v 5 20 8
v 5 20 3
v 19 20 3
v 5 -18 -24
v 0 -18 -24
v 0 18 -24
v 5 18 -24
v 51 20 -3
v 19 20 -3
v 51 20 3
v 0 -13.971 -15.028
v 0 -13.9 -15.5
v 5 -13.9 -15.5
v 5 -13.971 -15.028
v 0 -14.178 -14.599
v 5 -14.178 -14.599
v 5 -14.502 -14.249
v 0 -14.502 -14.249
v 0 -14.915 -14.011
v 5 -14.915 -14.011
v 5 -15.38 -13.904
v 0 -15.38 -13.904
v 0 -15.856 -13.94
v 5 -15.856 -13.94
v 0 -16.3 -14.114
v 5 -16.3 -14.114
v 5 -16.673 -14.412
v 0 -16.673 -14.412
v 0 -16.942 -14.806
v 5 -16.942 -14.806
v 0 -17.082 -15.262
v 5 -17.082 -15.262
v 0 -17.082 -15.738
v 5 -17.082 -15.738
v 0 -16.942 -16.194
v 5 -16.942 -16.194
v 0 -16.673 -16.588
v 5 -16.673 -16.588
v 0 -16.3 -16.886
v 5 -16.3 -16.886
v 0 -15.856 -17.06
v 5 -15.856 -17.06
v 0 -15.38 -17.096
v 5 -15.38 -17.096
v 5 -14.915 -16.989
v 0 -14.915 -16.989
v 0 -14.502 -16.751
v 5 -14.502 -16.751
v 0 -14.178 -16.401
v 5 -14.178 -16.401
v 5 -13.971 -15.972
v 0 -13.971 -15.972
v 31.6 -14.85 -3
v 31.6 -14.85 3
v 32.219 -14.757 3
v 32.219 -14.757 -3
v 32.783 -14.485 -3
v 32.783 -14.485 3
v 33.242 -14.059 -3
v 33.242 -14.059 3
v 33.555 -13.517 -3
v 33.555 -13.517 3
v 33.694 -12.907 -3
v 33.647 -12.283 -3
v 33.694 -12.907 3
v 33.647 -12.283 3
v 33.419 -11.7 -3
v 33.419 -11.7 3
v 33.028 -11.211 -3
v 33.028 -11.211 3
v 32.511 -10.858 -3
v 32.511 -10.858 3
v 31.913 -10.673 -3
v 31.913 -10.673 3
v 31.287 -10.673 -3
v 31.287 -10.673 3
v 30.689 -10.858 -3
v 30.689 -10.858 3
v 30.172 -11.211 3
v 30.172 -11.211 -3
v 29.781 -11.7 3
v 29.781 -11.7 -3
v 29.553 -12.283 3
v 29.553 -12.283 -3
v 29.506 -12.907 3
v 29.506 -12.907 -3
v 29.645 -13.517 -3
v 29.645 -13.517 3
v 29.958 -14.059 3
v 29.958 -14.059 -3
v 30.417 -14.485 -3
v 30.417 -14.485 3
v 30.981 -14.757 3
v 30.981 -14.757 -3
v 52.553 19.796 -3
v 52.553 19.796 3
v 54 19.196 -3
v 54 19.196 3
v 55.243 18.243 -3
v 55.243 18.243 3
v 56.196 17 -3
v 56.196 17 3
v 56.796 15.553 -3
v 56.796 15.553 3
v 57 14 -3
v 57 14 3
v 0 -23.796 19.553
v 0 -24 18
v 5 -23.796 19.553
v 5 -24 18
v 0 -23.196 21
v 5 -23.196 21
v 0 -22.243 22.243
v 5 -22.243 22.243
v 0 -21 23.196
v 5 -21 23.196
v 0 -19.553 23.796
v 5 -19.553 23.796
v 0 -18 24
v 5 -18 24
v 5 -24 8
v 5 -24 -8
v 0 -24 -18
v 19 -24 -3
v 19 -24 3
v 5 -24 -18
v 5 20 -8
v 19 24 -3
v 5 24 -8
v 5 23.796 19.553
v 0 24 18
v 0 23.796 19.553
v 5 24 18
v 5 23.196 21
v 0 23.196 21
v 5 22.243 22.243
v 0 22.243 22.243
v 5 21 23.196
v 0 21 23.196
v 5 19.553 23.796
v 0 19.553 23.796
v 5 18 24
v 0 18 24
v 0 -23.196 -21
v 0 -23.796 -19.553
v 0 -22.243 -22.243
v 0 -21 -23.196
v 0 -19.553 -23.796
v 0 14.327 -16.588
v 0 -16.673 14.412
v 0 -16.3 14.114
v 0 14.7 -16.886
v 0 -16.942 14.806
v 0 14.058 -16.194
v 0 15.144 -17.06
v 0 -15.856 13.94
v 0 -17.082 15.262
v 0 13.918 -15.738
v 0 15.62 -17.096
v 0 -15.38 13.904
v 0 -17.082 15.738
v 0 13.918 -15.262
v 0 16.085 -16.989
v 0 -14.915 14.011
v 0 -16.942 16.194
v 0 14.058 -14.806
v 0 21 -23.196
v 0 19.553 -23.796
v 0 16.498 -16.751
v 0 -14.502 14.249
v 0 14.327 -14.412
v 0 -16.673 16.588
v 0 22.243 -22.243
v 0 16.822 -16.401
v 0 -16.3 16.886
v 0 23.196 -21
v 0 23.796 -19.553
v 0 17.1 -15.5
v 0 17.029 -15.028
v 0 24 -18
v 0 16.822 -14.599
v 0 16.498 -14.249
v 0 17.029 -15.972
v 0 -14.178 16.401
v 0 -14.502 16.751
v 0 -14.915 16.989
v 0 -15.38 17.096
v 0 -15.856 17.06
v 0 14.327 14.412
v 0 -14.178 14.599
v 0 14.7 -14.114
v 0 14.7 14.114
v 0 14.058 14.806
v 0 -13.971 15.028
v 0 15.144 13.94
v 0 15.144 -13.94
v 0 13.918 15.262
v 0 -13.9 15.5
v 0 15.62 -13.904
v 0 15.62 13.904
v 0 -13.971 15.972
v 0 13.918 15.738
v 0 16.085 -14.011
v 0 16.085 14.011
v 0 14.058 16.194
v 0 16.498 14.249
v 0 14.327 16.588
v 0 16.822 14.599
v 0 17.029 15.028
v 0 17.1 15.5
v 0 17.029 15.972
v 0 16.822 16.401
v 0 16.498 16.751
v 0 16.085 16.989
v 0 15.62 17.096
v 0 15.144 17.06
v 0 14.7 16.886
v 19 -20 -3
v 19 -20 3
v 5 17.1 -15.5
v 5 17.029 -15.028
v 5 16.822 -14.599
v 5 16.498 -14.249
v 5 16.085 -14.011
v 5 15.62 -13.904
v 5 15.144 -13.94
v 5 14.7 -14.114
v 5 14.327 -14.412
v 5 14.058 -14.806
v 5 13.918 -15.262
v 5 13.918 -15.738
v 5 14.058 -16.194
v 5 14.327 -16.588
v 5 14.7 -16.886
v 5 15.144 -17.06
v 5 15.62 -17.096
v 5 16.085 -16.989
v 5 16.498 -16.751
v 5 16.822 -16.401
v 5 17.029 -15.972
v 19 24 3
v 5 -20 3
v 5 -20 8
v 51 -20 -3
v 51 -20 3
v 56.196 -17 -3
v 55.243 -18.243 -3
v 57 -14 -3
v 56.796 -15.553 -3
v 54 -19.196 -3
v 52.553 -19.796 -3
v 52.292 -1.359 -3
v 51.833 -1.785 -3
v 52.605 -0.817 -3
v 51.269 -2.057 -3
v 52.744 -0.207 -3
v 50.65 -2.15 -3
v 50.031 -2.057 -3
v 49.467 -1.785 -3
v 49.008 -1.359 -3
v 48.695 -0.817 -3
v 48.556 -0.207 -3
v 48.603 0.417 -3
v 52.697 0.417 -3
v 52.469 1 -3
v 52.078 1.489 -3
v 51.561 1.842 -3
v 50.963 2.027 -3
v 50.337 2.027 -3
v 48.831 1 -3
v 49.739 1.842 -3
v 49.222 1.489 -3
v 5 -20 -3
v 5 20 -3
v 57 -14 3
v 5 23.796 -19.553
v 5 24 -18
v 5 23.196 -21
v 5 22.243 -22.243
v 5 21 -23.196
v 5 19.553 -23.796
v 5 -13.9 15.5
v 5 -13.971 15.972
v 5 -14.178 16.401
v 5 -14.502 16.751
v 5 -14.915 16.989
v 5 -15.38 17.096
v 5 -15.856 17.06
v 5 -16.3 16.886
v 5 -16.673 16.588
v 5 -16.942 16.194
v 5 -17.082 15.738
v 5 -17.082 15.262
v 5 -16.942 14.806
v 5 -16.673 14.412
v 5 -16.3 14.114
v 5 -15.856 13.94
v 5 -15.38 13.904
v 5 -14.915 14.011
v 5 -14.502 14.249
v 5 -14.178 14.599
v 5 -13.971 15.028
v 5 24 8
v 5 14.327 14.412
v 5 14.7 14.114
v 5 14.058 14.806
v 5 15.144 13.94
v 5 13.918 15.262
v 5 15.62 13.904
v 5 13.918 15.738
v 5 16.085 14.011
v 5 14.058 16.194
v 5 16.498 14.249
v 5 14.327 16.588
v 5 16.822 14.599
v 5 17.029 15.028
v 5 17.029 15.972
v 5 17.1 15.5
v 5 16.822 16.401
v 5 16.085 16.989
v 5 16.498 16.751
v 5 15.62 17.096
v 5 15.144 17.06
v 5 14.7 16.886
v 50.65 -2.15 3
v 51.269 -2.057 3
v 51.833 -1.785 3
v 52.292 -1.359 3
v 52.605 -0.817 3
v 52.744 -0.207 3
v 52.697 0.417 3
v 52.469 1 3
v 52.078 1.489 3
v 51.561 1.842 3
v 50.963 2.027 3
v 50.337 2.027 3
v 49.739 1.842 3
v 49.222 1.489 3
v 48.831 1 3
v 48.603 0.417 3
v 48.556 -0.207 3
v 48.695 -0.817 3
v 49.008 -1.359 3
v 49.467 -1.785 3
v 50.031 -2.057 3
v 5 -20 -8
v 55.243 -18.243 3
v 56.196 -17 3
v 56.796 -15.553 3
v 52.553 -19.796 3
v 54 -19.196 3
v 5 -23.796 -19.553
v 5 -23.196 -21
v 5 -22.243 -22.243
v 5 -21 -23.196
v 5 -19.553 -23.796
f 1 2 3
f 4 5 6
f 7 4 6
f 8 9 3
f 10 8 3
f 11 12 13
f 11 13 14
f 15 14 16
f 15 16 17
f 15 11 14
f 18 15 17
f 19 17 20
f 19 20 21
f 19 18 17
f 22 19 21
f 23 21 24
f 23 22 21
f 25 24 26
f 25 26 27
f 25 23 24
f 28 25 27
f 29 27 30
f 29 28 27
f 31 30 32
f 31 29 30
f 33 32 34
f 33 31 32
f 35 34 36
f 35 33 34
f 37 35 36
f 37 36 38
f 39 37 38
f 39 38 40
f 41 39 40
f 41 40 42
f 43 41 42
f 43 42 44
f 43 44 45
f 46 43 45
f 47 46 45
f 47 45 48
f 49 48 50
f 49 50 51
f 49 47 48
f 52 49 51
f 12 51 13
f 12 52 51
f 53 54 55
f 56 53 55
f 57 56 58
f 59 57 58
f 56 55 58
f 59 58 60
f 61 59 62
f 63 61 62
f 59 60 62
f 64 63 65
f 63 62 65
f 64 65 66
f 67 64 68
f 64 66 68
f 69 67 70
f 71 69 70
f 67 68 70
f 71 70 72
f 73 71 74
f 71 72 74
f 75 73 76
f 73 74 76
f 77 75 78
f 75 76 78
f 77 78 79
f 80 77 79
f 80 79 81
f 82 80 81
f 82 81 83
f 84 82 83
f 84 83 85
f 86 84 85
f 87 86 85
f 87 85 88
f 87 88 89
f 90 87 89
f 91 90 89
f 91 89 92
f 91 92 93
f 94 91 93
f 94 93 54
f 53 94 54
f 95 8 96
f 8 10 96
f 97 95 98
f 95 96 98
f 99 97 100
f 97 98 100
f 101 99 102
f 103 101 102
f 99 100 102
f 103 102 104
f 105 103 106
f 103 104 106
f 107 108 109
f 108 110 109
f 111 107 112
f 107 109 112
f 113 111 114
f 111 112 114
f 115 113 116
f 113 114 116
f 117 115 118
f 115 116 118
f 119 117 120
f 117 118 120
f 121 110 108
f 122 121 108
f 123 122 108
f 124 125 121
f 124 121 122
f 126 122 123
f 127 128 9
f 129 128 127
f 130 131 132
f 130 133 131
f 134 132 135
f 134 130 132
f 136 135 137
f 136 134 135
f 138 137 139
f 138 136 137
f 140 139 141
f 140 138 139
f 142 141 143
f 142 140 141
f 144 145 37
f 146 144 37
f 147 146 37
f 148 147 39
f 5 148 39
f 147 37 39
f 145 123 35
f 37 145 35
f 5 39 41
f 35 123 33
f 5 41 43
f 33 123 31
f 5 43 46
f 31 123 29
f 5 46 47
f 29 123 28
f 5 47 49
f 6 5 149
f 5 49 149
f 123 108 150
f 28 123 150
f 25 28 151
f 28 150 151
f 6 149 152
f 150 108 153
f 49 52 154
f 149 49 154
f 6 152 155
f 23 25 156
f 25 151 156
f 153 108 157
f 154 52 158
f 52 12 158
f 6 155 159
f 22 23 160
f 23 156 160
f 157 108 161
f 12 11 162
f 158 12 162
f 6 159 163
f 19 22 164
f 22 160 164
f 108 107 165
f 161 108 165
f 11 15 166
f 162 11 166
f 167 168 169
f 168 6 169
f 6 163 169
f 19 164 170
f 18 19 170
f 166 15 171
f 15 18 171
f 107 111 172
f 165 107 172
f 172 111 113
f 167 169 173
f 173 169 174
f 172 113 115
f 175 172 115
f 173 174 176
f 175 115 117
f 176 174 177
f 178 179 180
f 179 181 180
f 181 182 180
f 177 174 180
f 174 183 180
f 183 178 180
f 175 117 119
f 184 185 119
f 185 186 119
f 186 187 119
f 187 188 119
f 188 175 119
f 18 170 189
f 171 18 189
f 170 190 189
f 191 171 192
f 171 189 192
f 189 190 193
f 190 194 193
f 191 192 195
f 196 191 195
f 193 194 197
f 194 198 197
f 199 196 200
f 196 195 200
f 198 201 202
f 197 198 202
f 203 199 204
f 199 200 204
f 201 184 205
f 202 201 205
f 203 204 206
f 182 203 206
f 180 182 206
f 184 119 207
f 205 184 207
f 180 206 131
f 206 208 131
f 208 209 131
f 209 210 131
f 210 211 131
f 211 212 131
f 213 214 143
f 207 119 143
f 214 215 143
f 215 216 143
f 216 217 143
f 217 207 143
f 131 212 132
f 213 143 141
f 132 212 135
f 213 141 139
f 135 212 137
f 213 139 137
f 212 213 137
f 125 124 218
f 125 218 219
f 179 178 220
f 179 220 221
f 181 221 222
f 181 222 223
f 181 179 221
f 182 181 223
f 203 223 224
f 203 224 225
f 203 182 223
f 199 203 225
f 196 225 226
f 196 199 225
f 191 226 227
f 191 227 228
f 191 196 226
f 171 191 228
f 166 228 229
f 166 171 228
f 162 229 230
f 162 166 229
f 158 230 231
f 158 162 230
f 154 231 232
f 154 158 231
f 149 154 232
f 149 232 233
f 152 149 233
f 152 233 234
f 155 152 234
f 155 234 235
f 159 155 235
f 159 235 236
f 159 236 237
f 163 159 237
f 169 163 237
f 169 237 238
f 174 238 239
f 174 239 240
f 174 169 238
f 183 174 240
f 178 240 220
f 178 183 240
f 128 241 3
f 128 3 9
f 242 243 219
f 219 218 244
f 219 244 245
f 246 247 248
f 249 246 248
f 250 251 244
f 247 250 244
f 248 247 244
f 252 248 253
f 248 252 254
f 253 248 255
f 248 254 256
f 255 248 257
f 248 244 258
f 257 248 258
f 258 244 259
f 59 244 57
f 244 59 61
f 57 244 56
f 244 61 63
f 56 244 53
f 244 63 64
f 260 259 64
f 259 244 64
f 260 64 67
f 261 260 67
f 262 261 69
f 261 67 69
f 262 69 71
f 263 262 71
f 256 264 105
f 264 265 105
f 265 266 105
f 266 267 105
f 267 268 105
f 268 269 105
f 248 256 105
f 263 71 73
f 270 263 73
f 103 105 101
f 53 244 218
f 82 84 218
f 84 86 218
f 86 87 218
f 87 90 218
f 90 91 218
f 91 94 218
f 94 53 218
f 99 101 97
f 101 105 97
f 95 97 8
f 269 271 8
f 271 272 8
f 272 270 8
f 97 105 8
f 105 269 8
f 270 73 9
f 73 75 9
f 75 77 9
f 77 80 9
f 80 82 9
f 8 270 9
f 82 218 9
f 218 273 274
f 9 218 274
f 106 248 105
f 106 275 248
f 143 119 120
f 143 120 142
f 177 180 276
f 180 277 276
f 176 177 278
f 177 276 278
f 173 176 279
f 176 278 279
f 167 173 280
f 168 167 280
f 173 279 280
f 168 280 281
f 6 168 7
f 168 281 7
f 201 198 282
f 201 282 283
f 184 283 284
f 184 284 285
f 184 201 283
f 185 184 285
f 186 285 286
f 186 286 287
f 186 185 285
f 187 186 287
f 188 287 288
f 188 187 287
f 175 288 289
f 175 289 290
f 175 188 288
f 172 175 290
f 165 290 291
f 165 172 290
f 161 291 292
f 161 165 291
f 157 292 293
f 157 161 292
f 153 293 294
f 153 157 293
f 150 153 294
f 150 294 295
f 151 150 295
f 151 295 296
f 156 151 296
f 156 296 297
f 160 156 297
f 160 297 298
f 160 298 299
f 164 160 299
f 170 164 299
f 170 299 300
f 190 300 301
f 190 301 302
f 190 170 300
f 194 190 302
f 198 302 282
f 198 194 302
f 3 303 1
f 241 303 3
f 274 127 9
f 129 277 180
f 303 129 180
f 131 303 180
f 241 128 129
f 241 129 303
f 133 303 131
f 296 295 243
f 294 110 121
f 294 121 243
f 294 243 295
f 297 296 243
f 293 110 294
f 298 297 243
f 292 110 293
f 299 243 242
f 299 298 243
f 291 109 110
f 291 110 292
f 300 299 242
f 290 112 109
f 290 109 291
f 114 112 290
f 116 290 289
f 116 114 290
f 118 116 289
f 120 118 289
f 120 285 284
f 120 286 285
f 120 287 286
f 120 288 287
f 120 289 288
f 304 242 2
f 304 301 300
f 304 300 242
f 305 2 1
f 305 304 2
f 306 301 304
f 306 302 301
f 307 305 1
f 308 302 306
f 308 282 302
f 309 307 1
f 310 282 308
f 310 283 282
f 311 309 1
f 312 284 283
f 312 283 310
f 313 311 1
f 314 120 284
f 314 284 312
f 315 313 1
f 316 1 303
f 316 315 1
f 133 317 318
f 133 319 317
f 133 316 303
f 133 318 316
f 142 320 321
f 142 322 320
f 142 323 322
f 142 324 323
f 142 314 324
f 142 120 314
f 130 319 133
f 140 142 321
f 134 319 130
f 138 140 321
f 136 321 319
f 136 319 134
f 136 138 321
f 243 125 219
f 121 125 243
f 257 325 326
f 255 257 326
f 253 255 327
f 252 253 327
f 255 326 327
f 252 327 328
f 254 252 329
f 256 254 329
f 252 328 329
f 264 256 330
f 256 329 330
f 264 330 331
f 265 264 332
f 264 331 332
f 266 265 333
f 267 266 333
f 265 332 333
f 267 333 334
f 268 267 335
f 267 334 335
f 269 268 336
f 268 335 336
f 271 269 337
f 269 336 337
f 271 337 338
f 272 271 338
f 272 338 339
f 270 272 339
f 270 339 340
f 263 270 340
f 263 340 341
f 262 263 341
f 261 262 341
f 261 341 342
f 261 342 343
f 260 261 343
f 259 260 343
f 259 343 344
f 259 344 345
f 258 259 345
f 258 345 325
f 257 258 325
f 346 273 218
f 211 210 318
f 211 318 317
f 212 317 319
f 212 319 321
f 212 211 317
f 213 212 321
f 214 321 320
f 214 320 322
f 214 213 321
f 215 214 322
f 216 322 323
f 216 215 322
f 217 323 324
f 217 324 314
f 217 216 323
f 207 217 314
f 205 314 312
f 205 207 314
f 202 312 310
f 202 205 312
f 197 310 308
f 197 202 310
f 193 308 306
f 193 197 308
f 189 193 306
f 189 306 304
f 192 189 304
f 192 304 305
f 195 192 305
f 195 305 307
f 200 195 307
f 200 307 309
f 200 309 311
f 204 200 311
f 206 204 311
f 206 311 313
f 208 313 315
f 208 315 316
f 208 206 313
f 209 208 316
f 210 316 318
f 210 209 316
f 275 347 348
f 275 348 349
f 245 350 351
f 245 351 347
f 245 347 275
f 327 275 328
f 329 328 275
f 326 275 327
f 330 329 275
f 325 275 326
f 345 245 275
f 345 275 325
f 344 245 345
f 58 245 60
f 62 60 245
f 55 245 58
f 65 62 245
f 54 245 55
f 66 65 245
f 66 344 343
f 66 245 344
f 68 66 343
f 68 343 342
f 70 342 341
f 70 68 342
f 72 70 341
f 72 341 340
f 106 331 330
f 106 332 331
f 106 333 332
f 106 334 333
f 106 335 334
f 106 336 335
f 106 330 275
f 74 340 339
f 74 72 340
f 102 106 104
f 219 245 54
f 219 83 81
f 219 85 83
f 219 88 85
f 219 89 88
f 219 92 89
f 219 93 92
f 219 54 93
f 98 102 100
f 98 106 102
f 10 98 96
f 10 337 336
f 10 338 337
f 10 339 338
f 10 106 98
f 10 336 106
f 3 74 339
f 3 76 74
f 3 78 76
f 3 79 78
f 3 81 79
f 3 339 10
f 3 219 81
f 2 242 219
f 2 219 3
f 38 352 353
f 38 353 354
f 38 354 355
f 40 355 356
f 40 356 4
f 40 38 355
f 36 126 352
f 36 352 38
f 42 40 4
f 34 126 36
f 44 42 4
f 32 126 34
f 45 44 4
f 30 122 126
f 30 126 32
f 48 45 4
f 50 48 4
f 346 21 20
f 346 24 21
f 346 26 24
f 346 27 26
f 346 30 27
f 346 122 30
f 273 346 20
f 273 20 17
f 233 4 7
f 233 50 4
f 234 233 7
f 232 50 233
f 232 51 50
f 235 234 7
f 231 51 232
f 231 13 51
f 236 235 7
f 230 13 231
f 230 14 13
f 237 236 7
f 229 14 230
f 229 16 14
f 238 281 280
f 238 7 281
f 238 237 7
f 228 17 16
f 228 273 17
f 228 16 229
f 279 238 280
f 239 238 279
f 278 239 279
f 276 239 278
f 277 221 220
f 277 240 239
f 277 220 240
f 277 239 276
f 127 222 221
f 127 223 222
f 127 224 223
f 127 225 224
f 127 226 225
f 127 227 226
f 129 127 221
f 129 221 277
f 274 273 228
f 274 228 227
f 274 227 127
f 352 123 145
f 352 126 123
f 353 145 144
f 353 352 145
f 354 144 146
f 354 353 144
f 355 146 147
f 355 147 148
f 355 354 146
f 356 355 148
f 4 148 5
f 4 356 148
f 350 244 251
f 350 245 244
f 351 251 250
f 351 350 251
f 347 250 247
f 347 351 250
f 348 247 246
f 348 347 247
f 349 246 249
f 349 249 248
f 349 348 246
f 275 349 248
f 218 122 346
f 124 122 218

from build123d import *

# Parameters (mm, degrees)
SKETCH_W     = 48
SKETCH_H     = 48
SKETCH_R     = 1.6
PAD_DEPTH    = 5
SKETCH001_W  = 40
SKETCH001_H  = 6
PAD001_DEPTH = 52
PAD002_DEPTH = 4
PAD003_DEPTH = 4
SKETCH004_R  = 2.1
POCKET_DEPTH = 8
FILLET_R     = 6


with BuildPart() as part:
    # Sketch → Pad (new body)
    with BuildSketch(Plane.YZ):
        Rectangle(SKETCH_W, SKETCH_H)
        with Locations((-15.5, 15.5)):
            Circle(SKETCH_R, mode=Mode.SUBTRACT)
        with Locations((-15.5, -15.5)):
            Circle(SKETCH_R, mode=Mode.SUBTRACT)
        with Locations((15.5, -15.5)):
            Circle(SKETCH_R, mode=Mode.SUBTRACT)
        with Locations((15.5, 15.5)):
            Circle(SKETCH_R, mode=Mode.SUBTRACT)
    extrude(amount=PAD_DEPTH)

    # Sketch001 (on Face10 of Pad) → Pad001 (join)
    with BuildSketch(Plane.YZ.offset(5)):
        Rectangle(SKETCH001_W, SKETCH001_H)
    extrude(amount=PAD001_DEPTH)

    # Sketch002 (on DatumPlane) → Pad002 (join)
    with BuildSketch(Plane(origin=(0, -24, 0), x_dir=(0, 0, -1), z_dir=(0, -1, 0))):
        Polygon((-8, 5), (8, 5), (3, 19), (-3, 19), align=None)
    extrude(amount=-PAD002_DEPTH)

    # Sketch003 (on DatumPlane) → Pad003 (join)
    with BuildSketch(Plane.ZX.offset(24)):
        Polygon((-8, 5), (8, 5), (3, 19), (-3, 19), align=None)
    extrude(amount=-PAD003_DEPTH)

    # Sketch004 (on Face16 of Pad003) → Pocket (cut)
    with BuildSketch(Plane(origin=(0, 0, 3), x_dir=(0, -1, 0), z_dir=(0, 0, 1))):
        with Locations((0.05, 50.65)):
            Circle(SKETCH004_R)
        with Locations((12.75, 31.6)):
            Circle(SKETCH004_R)
    extrude(amount=-POCKET_DEPTH, mode=Mode.SUBTRACT)

    # Fillet
    fillet_edges = [part.edges().sort_by_distance(p)[0] for p in [
        (2.5, -24, 24),
        (57, -20, 0),
        (57, 20, 0),
        (2.5, -24, -24),
        (2.5, 24, -24),
        (2.5, 24, 24),
    ]]
    fillet(fillet_edges, radius=FILLET_R)


solid = part.part
